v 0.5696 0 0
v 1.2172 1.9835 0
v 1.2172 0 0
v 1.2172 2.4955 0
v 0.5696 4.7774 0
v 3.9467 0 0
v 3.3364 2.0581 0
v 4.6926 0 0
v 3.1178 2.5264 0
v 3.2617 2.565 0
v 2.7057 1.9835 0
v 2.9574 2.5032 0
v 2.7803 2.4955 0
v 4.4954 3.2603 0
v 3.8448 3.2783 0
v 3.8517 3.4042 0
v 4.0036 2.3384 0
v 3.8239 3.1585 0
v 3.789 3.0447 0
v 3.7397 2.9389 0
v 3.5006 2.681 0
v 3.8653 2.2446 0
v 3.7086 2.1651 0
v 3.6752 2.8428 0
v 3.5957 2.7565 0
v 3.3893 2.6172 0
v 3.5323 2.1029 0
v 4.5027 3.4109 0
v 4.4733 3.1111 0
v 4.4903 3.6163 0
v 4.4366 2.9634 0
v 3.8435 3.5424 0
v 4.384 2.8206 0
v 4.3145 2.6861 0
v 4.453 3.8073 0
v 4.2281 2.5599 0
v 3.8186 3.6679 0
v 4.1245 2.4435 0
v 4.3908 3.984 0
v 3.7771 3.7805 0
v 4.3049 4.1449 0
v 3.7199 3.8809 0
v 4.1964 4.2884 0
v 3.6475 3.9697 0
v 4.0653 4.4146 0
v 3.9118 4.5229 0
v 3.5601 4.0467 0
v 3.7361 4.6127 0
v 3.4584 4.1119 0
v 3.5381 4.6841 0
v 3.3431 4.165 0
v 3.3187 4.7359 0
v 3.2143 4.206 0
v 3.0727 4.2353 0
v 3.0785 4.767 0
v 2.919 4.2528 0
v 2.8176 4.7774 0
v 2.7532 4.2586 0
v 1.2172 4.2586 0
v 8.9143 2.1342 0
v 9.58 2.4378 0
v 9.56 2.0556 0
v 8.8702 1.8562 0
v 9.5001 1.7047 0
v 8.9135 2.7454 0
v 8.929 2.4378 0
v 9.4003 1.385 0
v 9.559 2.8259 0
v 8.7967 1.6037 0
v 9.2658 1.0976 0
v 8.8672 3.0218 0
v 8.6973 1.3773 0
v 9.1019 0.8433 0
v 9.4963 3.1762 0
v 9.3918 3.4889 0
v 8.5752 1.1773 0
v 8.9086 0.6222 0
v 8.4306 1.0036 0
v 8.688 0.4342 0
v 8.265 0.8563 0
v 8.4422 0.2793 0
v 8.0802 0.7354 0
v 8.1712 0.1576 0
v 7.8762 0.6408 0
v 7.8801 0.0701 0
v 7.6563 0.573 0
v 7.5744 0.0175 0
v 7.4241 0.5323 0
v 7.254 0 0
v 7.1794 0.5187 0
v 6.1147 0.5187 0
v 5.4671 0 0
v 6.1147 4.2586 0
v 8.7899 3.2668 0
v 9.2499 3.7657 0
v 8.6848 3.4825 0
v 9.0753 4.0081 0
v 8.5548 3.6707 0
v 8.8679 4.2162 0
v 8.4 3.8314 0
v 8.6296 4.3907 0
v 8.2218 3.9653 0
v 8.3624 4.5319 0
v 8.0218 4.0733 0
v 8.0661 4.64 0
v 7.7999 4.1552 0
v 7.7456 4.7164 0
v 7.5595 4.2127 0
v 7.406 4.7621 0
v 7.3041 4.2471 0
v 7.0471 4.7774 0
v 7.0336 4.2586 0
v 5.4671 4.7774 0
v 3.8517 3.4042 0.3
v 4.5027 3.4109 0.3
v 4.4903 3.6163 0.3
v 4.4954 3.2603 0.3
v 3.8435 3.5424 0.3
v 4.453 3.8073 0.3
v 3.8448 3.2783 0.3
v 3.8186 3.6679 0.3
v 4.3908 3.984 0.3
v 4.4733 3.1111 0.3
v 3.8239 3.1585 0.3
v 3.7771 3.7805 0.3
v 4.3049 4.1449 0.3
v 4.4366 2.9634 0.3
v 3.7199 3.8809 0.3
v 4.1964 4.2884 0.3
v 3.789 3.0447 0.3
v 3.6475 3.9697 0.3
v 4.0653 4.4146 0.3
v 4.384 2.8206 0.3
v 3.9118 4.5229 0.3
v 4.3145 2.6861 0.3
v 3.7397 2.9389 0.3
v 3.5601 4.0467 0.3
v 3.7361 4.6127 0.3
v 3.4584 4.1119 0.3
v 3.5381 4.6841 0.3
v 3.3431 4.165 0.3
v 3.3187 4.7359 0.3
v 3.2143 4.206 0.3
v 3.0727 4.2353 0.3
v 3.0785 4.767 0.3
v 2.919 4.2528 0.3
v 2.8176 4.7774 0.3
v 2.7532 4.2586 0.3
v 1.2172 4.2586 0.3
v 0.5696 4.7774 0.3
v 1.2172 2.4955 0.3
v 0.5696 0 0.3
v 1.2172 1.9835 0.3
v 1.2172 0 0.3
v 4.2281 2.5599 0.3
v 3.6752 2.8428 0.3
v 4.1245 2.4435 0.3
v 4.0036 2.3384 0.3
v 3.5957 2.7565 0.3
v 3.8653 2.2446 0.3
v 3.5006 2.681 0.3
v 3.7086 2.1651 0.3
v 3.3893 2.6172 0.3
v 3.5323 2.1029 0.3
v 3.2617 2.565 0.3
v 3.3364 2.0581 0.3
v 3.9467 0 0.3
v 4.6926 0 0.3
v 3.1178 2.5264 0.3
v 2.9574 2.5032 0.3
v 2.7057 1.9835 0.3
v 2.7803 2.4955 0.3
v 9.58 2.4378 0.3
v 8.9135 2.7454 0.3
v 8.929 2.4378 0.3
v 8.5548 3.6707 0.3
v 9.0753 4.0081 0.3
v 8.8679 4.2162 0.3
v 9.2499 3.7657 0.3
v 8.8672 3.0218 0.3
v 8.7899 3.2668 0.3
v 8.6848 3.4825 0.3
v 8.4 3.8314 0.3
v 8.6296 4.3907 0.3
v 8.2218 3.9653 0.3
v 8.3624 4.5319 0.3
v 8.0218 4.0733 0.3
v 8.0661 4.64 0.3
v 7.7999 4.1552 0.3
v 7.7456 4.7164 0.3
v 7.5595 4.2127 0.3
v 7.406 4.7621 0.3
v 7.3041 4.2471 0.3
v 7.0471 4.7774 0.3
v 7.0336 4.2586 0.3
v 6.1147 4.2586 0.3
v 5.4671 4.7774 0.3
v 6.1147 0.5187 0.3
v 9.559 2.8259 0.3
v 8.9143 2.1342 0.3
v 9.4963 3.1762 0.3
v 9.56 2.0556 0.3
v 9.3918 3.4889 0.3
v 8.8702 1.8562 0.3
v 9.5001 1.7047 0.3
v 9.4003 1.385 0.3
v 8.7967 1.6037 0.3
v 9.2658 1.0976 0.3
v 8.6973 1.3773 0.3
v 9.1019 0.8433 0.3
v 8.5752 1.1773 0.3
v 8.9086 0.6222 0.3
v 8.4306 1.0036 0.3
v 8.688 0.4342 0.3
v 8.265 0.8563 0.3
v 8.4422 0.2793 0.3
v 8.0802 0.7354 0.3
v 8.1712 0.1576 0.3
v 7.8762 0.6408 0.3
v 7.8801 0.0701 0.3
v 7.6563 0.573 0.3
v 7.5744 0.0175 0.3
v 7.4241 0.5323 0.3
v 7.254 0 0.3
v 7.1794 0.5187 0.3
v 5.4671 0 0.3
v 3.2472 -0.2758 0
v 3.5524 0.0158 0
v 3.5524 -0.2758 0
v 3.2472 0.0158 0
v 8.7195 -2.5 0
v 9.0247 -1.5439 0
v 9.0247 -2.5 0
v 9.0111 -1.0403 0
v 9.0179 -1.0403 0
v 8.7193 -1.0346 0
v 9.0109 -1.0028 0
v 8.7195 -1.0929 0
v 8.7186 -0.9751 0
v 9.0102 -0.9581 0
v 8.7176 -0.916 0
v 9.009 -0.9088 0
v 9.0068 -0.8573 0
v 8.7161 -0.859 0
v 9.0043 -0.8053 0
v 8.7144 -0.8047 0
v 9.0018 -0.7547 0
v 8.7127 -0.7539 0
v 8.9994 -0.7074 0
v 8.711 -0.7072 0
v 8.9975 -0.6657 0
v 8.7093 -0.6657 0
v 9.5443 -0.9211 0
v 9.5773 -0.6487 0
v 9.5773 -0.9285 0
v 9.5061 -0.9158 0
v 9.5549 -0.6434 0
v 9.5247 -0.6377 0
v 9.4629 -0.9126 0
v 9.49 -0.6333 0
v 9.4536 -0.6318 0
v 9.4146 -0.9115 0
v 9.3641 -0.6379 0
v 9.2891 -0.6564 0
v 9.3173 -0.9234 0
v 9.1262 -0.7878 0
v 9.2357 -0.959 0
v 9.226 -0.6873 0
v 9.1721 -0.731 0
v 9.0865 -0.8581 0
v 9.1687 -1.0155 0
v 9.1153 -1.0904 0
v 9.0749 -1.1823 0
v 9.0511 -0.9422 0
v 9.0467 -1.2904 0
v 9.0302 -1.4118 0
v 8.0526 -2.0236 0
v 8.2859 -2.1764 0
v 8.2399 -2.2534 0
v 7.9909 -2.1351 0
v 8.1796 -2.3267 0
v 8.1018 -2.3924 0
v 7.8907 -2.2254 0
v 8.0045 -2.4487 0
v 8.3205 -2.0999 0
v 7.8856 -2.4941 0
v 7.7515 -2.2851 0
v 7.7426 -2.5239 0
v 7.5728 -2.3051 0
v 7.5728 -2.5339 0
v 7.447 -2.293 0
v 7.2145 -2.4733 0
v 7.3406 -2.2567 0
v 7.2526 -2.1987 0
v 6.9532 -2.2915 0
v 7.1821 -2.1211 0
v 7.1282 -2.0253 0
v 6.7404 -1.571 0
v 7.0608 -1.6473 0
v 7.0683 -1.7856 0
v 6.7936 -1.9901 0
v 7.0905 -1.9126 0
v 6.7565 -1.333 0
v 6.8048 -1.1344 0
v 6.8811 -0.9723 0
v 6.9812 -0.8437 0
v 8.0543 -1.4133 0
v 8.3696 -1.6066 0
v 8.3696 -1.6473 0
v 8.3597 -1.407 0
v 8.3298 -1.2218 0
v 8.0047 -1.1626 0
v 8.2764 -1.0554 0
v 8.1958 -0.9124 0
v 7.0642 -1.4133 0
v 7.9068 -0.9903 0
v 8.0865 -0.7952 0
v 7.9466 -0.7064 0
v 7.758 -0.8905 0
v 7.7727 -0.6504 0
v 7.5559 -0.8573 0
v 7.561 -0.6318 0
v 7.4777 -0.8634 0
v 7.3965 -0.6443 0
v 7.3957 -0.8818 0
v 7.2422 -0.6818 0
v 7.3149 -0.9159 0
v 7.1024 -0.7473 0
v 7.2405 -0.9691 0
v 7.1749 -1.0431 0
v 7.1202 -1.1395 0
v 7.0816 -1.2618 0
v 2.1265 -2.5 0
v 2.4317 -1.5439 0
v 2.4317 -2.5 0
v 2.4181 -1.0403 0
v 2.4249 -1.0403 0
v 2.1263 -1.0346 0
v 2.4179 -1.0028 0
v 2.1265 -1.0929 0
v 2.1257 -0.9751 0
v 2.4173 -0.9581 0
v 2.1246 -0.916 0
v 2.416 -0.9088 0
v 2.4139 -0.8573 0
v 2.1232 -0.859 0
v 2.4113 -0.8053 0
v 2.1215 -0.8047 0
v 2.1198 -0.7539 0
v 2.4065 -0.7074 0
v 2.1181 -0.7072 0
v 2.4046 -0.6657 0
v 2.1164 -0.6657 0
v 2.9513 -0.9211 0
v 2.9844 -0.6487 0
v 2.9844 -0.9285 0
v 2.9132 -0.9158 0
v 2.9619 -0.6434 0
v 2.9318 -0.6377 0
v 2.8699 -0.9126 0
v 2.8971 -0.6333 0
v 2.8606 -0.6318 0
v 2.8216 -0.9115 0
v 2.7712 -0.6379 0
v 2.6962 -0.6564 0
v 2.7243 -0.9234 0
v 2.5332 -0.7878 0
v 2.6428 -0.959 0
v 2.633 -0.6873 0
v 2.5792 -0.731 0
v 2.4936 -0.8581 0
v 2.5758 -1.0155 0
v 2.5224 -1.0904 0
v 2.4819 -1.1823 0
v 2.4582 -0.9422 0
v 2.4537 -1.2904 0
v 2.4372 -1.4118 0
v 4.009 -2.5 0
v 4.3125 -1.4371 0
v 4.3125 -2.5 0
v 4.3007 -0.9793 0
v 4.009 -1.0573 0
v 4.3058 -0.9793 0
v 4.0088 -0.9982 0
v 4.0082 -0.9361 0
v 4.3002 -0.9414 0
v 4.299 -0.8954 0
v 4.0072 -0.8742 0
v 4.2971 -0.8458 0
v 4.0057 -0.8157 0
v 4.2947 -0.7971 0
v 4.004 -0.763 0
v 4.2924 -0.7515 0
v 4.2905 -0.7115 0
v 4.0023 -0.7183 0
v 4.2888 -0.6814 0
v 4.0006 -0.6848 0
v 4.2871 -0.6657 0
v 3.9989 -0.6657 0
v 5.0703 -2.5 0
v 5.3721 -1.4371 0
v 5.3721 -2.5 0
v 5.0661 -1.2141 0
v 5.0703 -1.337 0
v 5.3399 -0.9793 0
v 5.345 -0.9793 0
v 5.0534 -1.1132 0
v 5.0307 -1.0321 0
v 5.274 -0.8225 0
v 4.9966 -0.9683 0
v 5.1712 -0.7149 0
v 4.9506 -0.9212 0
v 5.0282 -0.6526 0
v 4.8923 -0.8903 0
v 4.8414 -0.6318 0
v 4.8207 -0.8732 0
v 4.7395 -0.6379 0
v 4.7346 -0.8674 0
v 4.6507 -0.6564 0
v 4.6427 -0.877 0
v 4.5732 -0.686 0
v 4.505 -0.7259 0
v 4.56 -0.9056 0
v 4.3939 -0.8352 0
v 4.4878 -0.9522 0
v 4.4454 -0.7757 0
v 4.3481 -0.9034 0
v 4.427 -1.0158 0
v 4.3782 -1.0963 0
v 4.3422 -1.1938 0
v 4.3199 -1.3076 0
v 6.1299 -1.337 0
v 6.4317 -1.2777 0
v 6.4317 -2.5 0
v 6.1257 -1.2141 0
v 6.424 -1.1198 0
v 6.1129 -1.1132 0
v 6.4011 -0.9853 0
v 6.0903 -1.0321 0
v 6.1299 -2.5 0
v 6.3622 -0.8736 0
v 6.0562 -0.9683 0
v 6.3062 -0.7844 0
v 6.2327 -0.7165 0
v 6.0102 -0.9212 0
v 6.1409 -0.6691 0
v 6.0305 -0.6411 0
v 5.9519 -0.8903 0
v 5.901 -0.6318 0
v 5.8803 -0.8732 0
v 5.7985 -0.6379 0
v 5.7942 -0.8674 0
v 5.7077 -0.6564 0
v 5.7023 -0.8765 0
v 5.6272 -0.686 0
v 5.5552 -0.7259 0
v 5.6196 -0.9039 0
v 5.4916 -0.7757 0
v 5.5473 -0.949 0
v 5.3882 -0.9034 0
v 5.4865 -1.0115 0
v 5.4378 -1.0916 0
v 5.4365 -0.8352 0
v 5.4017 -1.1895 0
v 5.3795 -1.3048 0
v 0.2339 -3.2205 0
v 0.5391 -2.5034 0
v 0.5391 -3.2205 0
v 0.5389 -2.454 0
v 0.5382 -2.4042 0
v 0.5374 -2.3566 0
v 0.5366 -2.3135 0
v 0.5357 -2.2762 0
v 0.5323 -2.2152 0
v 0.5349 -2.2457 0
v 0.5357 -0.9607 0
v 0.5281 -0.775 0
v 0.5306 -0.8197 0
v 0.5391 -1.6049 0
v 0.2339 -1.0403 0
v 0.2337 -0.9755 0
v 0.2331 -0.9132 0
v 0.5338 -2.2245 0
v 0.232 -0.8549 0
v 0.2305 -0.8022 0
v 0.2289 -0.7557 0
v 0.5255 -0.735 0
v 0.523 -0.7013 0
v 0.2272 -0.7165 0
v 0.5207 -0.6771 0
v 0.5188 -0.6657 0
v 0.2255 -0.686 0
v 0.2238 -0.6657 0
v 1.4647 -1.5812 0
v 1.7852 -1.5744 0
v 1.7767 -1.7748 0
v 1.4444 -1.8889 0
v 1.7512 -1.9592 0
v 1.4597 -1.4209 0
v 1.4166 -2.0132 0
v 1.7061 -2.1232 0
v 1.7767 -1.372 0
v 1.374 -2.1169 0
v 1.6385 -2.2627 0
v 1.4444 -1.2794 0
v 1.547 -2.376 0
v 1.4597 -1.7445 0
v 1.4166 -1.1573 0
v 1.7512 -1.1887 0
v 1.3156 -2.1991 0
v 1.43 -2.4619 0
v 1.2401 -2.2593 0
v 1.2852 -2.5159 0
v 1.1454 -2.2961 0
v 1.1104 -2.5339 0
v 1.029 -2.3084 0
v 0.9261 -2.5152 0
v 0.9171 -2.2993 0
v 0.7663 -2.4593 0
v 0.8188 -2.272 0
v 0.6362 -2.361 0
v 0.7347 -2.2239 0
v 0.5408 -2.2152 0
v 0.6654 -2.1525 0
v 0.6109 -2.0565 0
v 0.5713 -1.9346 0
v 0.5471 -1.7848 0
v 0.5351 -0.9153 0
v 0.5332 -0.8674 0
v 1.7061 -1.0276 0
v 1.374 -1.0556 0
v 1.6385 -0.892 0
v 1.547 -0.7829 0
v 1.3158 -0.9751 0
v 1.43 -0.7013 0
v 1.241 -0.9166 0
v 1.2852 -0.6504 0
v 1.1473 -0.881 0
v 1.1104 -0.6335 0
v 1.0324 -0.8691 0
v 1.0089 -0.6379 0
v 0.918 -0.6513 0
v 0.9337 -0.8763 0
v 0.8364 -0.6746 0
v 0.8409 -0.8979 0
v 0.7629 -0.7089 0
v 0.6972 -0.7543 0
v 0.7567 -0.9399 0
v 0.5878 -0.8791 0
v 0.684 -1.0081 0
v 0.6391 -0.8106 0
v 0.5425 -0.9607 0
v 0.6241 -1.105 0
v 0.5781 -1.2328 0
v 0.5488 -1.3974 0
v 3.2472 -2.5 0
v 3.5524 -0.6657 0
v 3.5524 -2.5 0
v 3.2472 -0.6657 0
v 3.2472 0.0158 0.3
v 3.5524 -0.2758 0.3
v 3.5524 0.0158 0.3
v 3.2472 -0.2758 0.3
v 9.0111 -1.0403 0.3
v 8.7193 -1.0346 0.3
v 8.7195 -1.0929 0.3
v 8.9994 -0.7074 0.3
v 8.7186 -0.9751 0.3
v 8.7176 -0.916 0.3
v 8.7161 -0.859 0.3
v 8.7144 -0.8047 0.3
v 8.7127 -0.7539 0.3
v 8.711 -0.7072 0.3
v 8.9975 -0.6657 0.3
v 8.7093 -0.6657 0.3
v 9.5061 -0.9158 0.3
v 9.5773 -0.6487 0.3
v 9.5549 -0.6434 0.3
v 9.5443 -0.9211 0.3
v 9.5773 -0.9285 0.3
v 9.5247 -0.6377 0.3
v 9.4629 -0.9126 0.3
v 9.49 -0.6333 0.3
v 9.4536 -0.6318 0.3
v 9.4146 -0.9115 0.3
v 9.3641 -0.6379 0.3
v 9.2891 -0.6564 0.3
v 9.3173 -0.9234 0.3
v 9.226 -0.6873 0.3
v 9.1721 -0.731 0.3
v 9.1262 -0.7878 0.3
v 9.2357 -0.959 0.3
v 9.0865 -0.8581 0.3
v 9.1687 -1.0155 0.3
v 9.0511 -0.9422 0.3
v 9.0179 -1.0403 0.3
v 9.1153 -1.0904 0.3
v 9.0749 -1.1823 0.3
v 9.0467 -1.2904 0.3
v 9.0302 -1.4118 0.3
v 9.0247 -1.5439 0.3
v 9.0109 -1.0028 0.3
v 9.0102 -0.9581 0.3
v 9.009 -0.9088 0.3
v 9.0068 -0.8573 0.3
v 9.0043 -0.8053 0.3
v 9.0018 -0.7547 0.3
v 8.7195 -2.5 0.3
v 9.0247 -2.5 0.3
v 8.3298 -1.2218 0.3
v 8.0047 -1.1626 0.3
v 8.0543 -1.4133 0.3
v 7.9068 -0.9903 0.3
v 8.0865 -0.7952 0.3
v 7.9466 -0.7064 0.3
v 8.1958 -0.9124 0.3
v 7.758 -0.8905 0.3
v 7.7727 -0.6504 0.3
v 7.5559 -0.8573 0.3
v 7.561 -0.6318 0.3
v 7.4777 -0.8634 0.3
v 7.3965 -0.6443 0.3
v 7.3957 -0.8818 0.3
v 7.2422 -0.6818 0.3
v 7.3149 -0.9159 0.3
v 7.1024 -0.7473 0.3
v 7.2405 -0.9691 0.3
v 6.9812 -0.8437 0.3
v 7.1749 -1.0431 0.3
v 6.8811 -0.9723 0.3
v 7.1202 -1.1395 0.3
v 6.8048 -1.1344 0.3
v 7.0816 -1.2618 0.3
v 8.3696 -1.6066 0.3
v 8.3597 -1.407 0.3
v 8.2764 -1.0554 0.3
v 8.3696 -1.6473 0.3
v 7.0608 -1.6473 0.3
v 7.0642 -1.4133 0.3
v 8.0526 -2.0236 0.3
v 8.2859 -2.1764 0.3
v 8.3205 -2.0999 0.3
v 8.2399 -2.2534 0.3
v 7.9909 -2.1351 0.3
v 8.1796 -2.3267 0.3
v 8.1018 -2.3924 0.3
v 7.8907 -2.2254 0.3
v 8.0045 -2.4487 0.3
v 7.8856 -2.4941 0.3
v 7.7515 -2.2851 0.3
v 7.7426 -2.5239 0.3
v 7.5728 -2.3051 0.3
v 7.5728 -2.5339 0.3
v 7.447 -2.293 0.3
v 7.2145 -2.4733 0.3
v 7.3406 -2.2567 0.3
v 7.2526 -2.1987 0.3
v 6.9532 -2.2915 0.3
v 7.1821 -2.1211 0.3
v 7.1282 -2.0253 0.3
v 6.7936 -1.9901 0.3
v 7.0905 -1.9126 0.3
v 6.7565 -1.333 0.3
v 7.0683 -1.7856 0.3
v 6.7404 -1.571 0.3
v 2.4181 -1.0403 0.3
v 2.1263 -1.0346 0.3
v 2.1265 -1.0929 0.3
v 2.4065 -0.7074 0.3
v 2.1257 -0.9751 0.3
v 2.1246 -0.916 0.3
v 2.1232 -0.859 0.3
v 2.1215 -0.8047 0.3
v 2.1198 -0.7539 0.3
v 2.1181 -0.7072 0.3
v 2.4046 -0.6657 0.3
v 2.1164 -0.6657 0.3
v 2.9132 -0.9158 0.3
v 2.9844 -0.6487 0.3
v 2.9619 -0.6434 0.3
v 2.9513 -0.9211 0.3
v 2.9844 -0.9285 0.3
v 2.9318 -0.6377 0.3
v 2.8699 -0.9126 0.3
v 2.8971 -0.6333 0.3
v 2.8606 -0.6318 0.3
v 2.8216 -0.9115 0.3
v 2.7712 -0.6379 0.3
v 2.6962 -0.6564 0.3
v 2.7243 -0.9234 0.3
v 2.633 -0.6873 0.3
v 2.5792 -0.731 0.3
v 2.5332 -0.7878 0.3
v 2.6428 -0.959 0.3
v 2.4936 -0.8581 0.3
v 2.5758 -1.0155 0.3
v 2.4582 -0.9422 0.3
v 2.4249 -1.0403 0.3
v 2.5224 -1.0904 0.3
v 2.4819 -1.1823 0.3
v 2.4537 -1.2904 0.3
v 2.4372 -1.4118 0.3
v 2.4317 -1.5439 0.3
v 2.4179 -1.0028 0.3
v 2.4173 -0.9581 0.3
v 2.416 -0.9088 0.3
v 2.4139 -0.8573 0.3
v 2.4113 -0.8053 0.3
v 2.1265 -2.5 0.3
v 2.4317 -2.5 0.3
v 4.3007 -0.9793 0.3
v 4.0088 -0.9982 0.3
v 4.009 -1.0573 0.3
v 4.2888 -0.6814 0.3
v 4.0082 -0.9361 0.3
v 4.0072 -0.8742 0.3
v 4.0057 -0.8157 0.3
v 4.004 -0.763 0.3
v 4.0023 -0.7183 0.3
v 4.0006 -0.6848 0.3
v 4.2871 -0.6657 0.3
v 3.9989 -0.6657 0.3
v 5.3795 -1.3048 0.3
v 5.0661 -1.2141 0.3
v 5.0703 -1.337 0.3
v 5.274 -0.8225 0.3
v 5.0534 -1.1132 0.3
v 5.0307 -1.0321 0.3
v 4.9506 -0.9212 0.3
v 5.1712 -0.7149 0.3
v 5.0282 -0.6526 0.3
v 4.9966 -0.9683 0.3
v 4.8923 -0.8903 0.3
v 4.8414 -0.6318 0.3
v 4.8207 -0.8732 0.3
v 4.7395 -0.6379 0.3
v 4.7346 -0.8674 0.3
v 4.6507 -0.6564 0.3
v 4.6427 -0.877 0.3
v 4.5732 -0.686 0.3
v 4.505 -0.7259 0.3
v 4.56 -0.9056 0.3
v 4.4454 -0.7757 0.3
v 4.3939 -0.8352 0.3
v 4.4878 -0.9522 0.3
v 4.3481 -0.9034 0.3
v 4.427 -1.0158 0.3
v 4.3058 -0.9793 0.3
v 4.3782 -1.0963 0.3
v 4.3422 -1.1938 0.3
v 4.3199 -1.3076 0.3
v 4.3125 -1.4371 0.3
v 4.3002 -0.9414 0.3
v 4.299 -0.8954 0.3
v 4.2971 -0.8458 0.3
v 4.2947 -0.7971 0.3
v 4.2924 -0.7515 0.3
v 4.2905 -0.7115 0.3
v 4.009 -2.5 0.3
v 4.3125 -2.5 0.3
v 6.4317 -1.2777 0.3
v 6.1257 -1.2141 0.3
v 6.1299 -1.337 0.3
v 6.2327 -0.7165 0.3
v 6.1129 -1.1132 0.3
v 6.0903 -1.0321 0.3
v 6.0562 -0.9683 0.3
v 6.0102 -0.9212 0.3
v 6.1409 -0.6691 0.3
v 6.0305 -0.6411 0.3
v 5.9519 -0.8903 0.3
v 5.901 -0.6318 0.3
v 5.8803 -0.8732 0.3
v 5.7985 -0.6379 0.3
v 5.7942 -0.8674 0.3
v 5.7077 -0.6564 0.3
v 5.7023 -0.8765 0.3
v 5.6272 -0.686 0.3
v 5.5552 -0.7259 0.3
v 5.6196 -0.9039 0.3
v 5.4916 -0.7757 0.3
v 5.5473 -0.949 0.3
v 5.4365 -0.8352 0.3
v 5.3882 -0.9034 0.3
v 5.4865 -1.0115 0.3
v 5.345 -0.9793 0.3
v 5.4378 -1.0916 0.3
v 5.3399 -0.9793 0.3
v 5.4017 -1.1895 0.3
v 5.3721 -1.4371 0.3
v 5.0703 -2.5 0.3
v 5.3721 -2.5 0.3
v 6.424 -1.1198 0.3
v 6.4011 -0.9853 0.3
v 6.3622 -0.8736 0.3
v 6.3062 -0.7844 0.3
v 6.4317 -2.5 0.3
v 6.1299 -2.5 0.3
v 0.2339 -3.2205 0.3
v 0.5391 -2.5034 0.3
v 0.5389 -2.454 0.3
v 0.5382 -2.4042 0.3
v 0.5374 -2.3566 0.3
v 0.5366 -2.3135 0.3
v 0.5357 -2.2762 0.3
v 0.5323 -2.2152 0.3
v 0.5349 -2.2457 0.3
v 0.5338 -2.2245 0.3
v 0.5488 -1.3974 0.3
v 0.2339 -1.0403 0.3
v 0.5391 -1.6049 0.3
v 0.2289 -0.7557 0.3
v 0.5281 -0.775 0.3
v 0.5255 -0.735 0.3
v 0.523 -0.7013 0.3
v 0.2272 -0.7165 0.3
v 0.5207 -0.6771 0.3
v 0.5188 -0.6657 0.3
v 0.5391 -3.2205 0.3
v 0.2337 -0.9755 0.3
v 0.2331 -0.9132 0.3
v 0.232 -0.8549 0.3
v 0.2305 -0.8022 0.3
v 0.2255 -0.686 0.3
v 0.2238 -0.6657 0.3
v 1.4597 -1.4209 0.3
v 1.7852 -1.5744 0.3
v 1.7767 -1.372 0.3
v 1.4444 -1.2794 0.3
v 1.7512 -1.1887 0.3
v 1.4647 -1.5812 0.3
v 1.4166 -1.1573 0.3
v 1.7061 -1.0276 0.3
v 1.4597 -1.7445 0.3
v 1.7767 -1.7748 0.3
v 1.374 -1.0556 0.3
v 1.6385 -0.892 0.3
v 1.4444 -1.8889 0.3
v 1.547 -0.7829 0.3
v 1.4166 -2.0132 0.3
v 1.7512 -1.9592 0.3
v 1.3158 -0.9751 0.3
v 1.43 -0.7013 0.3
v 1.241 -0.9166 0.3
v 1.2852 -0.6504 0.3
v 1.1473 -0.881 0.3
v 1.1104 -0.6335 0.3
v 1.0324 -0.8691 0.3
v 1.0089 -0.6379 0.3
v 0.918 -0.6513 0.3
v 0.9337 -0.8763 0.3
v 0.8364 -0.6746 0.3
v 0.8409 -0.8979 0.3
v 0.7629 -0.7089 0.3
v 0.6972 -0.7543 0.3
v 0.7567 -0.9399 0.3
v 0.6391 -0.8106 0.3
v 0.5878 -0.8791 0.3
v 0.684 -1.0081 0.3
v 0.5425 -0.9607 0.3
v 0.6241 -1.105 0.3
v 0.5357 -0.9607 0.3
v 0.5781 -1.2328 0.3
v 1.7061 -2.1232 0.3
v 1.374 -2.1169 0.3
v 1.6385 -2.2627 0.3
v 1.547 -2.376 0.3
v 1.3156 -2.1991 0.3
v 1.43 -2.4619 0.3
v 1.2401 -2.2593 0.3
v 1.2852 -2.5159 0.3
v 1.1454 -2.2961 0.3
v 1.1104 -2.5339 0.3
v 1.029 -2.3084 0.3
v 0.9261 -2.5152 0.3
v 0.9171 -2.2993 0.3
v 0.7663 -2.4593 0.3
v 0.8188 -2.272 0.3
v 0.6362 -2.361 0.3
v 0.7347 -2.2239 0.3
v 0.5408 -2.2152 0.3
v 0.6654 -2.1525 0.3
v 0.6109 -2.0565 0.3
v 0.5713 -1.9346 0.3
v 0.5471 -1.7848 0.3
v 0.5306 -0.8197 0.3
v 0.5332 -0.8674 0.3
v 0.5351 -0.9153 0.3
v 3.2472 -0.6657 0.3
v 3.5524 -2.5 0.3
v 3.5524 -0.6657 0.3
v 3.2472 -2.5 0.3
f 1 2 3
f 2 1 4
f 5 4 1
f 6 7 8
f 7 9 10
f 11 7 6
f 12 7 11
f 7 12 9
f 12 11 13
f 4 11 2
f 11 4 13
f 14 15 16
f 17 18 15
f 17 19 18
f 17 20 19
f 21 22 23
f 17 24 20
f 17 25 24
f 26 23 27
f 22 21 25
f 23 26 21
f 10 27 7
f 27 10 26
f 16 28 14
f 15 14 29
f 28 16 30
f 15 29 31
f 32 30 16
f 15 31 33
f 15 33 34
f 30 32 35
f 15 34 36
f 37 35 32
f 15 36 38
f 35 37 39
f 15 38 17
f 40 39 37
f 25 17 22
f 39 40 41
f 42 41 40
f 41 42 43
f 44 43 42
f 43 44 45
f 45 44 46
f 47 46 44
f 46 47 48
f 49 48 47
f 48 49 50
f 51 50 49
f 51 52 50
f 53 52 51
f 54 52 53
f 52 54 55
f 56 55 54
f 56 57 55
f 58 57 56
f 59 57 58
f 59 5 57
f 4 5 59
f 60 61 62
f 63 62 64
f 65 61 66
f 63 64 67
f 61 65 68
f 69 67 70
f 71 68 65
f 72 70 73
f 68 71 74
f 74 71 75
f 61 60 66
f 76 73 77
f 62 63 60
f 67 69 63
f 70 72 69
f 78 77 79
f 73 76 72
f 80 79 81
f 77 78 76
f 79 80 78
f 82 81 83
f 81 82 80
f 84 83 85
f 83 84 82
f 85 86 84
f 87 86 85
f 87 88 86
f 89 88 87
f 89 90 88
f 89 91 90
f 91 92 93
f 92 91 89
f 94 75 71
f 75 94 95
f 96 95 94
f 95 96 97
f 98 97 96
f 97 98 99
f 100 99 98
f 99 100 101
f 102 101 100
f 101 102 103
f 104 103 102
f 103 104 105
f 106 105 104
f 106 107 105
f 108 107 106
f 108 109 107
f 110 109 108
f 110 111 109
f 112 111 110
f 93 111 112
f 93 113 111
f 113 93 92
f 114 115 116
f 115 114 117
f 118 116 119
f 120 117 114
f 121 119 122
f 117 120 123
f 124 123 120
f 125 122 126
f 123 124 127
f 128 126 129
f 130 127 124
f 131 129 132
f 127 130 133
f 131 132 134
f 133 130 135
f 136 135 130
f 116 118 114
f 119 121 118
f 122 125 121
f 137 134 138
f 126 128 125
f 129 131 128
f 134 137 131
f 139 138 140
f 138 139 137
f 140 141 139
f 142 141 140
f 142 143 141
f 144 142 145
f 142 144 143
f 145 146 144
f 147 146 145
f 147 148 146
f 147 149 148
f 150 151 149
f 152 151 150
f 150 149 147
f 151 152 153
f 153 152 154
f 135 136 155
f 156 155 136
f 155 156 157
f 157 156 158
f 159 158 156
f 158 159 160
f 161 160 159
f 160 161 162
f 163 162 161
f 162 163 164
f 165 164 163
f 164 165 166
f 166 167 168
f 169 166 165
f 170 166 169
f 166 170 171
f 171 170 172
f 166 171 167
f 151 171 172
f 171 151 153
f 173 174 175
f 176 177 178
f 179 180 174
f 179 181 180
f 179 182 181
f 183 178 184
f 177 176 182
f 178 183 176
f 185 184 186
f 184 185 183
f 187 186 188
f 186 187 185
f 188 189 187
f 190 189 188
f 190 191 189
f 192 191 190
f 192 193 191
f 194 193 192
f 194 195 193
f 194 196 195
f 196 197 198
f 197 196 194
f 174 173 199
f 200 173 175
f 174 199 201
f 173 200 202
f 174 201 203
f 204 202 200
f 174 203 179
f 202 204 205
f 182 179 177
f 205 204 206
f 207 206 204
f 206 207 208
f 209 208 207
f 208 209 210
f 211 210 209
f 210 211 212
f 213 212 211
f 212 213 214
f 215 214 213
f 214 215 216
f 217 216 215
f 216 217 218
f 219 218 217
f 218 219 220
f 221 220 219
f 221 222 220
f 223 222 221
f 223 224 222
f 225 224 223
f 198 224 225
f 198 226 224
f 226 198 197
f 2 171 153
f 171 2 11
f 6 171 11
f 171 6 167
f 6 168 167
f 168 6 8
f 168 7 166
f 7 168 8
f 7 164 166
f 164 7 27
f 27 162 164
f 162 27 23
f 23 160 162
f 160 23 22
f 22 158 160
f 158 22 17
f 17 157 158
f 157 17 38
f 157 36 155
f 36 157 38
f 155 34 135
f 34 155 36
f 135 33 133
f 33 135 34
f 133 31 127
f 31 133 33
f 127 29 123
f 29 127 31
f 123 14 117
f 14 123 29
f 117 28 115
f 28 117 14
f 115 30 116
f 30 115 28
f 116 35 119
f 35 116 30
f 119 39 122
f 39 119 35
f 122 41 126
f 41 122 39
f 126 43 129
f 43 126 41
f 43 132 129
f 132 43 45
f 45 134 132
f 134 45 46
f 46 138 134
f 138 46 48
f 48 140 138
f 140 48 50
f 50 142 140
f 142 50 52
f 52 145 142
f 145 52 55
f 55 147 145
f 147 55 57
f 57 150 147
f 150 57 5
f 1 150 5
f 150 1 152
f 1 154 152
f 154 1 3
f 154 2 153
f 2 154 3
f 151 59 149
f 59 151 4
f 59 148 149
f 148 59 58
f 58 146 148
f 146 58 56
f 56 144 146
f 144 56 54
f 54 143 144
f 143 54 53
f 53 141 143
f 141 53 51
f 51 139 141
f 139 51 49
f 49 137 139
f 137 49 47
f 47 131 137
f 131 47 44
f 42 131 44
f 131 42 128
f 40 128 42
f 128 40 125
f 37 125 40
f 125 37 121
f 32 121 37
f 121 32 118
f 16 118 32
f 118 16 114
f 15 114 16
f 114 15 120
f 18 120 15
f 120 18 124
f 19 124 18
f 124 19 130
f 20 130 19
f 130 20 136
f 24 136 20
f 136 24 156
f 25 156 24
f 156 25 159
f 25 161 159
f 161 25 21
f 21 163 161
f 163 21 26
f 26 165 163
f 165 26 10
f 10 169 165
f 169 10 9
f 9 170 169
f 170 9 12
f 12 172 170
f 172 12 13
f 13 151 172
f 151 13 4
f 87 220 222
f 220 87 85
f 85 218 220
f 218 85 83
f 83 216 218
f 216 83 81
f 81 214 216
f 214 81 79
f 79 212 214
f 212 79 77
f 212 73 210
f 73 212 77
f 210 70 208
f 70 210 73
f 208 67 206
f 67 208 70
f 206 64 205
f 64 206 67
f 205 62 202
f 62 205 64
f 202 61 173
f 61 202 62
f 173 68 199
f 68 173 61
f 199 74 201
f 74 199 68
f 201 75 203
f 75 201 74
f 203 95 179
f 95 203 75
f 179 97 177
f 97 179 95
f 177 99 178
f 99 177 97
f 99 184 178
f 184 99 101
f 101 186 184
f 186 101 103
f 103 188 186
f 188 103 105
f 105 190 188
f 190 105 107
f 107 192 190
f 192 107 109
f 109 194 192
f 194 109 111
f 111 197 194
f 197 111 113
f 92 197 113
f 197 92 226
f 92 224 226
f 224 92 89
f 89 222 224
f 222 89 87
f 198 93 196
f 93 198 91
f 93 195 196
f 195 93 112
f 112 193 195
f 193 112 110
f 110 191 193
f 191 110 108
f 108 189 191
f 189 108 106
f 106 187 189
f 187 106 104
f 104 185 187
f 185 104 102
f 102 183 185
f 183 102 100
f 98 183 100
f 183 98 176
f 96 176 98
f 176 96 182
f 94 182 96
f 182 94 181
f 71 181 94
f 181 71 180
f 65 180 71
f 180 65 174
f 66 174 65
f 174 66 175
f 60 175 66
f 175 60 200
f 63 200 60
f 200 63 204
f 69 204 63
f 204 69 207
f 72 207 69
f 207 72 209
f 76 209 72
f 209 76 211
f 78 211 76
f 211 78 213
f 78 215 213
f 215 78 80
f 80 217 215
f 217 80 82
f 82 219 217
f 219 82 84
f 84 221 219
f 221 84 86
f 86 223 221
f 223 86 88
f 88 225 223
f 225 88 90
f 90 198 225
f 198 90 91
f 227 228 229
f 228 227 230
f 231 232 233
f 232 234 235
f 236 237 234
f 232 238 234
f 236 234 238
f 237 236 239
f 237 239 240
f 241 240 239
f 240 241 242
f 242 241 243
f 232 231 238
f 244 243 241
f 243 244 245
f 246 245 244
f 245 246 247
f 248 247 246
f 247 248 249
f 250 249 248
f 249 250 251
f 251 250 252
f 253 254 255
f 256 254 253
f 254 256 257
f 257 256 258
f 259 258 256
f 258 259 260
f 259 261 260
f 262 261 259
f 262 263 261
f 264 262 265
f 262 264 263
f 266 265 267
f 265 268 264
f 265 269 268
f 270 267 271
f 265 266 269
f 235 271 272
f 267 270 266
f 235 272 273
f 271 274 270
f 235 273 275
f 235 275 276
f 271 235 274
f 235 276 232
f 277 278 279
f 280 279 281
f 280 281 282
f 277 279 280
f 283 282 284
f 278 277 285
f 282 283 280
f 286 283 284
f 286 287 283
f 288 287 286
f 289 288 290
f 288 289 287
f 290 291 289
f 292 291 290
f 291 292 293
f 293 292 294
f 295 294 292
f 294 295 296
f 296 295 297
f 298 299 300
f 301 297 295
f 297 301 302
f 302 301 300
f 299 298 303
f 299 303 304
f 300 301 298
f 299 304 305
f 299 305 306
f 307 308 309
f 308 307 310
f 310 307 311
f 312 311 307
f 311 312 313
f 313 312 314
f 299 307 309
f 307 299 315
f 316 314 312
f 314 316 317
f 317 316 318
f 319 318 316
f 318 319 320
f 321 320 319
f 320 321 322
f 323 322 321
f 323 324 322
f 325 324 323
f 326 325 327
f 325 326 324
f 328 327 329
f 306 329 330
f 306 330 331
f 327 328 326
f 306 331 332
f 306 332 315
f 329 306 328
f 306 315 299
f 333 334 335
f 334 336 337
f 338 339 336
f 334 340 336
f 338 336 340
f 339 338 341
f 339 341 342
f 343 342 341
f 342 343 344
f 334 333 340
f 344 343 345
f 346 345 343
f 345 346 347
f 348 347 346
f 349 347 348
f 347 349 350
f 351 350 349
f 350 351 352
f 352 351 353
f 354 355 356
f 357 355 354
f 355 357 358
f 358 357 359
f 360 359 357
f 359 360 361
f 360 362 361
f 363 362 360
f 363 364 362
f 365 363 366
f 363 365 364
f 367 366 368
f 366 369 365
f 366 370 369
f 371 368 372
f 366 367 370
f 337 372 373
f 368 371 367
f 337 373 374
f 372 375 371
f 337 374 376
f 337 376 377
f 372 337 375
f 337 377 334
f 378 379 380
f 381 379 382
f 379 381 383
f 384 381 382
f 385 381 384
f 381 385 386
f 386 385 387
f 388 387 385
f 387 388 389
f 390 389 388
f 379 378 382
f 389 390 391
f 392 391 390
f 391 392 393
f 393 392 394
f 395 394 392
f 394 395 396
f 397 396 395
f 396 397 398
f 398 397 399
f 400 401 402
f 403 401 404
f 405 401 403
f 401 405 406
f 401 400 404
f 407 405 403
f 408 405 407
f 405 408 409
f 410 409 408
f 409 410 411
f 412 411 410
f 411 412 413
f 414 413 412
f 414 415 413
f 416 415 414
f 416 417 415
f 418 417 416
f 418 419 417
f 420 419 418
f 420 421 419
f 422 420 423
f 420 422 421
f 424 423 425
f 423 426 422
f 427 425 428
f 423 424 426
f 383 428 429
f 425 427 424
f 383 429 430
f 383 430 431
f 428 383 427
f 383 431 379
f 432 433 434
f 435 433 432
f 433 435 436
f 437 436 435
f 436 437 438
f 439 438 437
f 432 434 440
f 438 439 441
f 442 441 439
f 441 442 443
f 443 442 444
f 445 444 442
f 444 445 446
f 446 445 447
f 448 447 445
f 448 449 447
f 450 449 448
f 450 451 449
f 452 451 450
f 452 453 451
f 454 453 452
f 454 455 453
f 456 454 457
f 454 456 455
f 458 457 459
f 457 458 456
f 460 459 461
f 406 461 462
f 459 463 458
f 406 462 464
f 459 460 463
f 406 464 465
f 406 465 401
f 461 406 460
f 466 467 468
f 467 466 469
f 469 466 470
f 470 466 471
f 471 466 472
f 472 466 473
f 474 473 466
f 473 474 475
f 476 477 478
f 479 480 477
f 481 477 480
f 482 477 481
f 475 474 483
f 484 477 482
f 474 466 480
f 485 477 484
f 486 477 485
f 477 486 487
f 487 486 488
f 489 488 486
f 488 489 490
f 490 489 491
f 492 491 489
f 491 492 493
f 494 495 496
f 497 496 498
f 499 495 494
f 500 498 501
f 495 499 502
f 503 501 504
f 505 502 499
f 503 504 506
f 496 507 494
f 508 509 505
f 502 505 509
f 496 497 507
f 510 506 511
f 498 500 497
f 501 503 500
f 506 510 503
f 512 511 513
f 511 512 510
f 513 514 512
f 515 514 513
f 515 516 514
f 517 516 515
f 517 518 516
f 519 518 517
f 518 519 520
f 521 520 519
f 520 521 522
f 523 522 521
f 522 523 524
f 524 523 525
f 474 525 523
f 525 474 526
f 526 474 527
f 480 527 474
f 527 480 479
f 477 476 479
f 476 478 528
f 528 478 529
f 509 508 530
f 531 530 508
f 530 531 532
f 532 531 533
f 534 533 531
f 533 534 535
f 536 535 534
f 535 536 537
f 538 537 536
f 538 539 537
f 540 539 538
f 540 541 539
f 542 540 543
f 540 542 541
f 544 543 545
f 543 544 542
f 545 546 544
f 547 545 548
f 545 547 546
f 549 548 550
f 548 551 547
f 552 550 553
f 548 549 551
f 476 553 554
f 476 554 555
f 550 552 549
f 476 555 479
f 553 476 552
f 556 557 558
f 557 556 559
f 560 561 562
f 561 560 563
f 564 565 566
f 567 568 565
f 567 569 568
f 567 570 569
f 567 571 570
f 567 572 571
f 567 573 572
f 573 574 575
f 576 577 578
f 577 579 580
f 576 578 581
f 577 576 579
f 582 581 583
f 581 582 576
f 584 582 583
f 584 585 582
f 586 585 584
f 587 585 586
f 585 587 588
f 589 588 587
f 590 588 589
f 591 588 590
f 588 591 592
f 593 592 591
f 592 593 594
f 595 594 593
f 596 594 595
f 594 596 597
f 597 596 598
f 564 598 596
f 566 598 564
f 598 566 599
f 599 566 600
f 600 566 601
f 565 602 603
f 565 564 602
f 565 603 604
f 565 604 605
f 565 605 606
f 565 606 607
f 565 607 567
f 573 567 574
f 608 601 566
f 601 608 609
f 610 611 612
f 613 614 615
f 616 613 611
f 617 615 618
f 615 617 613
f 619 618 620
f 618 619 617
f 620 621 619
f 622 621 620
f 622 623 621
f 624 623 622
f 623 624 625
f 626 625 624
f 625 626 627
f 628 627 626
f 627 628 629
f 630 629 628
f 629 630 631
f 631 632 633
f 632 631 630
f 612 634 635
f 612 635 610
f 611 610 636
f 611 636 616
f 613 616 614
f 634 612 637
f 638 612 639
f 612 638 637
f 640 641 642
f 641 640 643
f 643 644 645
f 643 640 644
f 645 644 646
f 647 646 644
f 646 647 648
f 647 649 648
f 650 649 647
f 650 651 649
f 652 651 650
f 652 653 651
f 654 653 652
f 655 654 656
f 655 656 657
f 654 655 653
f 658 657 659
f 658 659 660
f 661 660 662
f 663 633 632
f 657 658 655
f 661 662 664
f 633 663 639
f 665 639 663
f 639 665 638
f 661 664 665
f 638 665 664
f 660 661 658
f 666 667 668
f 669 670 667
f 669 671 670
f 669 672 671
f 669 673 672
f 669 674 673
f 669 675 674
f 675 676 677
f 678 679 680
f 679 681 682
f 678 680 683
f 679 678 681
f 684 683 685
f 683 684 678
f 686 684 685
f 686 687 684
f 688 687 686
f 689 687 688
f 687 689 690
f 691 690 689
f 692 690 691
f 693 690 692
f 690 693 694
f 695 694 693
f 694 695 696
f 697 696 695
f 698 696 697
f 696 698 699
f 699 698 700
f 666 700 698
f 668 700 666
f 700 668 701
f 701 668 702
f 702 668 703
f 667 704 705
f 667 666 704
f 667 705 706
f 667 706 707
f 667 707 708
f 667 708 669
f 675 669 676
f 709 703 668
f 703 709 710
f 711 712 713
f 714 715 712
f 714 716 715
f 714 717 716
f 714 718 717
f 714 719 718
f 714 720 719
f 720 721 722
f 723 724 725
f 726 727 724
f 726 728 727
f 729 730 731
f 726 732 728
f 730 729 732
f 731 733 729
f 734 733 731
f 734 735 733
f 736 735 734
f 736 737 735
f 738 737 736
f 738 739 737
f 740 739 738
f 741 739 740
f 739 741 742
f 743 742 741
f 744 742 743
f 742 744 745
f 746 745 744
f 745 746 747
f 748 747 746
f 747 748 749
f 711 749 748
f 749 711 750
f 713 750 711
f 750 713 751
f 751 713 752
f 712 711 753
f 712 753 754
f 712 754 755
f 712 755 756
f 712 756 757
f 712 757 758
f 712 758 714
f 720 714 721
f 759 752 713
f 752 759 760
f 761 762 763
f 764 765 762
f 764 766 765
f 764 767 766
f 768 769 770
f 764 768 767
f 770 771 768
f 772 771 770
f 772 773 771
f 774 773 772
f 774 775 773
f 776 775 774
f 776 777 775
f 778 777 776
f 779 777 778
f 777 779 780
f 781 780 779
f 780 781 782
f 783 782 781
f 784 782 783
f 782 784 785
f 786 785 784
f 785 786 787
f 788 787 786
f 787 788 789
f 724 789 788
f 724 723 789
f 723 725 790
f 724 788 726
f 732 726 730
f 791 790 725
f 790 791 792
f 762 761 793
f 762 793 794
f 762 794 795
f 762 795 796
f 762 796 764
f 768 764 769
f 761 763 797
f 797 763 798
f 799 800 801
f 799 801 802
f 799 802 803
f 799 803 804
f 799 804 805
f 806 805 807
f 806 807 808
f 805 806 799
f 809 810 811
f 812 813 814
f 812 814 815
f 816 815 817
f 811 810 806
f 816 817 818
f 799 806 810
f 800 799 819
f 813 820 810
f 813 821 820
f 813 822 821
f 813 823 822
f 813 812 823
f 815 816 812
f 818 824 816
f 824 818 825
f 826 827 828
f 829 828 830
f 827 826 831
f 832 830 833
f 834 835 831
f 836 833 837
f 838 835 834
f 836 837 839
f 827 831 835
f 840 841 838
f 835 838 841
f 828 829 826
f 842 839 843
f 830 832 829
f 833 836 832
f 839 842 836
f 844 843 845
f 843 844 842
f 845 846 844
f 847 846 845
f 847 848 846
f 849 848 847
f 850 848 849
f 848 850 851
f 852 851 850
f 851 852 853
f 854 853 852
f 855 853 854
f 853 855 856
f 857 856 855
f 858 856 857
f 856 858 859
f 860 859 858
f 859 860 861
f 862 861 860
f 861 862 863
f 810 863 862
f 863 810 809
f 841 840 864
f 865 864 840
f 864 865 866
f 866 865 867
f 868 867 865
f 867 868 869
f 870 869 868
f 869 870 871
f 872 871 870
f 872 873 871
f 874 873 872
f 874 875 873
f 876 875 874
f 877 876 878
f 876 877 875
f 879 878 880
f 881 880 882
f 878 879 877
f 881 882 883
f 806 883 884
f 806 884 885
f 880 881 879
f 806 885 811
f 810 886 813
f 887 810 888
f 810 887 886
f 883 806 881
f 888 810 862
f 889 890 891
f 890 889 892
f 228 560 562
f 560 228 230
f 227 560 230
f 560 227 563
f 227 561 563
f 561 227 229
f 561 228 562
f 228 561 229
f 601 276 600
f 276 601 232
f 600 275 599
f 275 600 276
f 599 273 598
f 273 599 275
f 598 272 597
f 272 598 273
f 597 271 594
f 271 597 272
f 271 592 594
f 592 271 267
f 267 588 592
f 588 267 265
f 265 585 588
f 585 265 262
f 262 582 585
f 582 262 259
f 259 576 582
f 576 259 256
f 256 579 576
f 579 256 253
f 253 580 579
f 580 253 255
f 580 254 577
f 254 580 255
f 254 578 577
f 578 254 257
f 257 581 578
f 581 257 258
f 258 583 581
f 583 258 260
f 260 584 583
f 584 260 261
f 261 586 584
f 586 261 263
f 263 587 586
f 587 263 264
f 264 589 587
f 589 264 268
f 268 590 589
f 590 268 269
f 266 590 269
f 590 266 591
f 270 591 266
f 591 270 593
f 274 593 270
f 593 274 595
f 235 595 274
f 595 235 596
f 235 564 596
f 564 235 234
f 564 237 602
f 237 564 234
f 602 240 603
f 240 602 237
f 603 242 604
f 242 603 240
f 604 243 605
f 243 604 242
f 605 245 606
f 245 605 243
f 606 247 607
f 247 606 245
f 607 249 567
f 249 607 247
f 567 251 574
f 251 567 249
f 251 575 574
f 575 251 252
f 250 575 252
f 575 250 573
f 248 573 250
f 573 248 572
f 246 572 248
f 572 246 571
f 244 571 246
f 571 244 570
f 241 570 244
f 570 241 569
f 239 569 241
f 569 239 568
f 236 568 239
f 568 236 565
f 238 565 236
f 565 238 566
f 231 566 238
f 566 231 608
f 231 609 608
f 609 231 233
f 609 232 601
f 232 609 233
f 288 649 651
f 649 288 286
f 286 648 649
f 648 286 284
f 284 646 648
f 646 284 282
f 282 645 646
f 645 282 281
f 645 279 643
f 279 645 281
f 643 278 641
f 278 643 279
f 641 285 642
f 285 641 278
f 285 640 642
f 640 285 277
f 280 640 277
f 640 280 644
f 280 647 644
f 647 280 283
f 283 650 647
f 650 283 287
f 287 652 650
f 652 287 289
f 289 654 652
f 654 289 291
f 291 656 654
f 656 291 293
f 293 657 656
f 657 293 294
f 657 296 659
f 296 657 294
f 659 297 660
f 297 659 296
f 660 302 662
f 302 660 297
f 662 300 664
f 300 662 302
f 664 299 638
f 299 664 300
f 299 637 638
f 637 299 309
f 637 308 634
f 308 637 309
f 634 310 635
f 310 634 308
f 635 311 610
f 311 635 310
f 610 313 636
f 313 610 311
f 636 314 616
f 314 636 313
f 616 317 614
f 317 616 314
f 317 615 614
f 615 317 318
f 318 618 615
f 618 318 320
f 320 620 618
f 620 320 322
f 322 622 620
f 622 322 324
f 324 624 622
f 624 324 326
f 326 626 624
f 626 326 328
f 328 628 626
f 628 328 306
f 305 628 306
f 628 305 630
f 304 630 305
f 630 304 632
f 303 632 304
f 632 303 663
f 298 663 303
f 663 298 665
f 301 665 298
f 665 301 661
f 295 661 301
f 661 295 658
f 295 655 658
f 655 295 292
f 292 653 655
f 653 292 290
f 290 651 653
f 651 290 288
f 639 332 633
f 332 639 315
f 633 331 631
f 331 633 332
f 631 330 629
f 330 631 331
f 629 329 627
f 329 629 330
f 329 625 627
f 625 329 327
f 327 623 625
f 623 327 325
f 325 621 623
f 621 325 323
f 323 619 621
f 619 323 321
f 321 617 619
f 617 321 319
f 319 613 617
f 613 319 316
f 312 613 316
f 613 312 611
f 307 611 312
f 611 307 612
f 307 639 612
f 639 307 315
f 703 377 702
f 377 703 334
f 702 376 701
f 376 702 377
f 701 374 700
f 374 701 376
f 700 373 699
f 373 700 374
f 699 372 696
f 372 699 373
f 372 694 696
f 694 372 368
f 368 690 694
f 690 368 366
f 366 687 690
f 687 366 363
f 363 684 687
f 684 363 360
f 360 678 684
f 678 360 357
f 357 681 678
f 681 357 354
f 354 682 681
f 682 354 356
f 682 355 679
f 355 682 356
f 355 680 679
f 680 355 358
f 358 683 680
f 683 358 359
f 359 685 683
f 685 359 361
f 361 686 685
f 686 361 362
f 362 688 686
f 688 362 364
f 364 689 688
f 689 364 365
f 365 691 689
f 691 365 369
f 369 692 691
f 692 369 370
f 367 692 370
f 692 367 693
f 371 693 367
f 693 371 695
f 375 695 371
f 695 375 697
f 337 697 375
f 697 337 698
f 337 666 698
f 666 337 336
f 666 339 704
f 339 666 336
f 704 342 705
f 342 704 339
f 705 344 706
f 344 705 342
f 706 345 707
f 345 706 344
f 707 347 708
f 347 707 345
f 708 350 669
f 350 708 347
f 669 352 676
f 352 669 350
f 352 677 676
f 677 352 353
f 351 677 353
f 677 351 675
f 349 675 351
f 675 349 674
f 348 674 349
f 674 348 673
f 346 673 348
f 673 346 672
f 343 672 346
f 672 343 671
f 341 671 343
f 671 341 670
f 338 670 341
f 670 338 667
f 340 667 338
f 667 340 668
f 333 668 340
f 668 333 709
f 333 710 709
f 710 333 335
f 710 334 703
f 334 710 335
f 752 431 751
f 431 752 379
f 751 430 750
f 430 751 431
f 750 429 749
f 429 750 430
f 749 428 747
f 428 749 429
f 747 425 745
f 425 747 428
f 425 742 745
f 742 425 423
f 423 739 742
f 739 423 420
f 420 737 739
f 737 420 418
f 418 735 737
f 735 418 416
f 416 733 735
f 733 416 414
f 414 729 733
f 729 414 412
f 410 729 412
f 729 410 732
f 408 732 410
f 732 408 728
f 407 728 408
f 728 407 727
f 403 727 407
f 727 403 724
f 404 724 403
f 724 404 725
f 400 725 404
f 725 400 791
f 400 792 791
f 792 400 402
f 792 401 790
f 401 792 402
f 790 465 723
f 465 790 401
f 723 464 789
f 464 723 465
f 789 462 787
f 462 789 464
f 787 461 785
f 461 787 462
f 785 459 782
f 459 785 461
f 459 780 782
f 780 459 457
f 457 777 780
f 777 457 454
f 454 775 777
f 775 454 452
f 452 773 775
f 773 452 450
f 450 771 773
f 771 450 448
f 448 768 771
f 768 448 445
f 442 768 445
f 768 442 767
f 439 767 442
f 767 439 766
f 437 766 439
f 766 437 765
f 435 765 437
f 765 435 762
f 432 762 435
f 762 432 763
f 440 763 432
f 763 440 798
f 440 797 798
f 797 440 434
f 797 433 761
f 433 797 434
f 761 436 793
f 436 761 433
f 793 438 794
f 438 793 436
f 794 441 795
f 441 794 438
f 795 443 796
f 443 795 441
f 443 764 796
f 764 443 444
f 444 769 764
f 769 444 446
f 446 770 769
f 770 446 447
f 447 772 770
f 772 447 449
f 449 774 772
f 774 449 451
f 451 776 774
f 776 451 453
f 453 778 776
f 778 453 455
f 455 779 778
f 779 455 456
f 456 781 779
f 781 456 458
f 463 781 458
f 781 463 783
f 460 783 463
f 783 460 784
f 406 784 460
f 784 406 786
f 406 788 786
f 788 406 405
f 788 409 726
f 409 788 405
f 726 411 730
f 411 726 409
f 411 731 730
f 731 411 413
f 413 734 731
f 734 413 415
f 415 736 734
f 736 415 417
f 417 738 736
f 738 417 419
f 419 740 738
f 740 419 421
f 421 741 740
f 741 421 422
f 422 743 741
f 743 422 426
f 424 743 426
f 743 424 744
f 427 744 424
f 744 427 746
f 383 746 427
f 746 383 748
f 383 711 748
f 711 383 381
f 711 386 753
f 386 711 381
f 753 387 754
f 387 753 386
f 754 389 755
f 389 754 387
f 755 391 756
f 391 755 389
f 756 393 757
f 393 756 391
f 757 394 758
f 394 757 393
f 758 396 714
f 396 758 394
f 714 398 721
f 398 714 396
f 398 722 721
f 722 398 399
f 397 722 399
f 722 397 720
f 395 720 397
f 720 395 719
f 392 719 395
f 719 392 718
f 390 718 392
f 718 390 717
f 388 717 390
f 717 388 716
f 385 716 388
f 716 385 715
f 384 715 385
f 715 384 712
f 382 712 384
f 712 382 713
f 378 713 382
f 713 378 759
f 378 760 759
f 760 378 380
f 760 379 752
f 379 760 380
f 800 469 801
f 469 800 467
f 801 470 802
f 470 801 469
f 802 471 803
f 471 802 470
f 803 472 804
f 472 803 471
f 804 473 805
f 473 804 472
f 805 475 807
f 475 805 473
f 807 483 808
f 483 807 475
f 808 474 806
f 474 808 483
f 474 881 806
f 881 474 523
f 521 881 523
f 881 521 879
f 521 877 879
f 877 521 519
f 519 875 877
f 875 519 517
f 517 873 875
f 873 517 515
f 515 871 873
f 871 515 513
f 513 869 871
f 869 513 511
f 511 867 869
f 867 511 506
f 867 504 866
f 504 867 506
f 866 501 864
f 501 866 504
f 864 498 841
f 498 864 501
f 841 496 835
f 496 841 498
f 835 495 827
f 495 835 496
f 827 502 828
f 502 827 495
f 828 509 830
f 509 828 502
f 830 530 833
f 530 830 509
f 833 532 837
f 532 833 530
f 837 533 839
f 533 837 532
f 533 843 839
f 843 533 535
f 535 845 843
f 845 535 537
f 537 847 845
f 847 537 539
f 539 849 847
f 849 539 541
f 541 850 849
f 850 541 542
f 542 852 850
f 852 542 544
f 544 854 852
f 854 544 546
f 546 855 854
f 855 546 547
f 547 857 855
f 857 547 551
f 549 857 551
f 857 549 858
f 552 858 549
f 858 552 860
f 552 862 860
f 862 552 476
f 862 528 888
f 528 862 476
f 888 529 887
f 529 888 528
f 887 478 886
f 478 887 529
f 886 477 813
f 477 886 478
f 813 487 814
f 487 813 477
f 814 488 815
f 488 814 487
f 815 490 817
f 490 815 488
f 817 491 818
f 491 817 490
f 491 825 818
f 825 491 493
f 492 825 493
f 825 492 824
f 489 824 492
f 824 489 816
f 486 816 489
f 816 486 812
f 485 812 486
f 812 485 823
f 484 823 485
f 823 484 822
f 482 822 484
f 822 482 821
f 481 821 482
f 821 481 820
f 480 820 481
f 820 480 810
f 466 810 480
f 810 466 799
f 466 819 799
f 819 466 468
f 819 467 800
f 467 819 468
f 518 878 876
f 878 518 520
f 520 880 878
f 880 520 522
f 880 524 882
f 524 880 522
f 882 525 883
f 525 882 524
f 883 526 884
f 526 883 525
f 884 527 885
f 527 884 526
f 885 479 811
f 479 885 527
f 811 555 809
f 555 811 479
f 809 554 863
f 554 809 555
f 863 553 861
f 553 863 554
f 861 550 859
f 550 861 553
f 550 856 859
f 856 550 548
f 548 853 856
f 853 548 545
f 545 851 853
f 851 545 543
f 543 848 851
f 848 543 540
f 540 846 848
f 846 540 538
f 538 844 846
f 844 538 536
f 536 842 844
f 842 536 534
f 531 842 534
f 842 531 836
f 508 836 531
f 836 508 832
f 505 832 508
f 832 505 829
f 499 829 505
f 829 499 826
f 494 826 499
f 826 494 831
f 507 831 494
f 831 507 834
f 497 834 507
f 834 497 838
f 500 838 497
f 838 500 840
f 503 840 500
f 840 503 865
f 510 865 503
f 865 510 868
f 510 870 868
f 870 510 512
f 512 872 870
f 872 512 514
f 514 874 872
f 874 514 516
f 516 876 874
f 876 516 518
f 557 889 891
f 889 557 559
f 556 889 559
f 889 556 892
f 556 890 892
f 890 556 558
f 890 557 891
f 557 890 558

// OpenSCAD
linear_extrude(0.3) text(text="RD", size=5);
translate([0,-2.5,0]) linear_extrude(0.3) text(text="primer", size=2.5);
